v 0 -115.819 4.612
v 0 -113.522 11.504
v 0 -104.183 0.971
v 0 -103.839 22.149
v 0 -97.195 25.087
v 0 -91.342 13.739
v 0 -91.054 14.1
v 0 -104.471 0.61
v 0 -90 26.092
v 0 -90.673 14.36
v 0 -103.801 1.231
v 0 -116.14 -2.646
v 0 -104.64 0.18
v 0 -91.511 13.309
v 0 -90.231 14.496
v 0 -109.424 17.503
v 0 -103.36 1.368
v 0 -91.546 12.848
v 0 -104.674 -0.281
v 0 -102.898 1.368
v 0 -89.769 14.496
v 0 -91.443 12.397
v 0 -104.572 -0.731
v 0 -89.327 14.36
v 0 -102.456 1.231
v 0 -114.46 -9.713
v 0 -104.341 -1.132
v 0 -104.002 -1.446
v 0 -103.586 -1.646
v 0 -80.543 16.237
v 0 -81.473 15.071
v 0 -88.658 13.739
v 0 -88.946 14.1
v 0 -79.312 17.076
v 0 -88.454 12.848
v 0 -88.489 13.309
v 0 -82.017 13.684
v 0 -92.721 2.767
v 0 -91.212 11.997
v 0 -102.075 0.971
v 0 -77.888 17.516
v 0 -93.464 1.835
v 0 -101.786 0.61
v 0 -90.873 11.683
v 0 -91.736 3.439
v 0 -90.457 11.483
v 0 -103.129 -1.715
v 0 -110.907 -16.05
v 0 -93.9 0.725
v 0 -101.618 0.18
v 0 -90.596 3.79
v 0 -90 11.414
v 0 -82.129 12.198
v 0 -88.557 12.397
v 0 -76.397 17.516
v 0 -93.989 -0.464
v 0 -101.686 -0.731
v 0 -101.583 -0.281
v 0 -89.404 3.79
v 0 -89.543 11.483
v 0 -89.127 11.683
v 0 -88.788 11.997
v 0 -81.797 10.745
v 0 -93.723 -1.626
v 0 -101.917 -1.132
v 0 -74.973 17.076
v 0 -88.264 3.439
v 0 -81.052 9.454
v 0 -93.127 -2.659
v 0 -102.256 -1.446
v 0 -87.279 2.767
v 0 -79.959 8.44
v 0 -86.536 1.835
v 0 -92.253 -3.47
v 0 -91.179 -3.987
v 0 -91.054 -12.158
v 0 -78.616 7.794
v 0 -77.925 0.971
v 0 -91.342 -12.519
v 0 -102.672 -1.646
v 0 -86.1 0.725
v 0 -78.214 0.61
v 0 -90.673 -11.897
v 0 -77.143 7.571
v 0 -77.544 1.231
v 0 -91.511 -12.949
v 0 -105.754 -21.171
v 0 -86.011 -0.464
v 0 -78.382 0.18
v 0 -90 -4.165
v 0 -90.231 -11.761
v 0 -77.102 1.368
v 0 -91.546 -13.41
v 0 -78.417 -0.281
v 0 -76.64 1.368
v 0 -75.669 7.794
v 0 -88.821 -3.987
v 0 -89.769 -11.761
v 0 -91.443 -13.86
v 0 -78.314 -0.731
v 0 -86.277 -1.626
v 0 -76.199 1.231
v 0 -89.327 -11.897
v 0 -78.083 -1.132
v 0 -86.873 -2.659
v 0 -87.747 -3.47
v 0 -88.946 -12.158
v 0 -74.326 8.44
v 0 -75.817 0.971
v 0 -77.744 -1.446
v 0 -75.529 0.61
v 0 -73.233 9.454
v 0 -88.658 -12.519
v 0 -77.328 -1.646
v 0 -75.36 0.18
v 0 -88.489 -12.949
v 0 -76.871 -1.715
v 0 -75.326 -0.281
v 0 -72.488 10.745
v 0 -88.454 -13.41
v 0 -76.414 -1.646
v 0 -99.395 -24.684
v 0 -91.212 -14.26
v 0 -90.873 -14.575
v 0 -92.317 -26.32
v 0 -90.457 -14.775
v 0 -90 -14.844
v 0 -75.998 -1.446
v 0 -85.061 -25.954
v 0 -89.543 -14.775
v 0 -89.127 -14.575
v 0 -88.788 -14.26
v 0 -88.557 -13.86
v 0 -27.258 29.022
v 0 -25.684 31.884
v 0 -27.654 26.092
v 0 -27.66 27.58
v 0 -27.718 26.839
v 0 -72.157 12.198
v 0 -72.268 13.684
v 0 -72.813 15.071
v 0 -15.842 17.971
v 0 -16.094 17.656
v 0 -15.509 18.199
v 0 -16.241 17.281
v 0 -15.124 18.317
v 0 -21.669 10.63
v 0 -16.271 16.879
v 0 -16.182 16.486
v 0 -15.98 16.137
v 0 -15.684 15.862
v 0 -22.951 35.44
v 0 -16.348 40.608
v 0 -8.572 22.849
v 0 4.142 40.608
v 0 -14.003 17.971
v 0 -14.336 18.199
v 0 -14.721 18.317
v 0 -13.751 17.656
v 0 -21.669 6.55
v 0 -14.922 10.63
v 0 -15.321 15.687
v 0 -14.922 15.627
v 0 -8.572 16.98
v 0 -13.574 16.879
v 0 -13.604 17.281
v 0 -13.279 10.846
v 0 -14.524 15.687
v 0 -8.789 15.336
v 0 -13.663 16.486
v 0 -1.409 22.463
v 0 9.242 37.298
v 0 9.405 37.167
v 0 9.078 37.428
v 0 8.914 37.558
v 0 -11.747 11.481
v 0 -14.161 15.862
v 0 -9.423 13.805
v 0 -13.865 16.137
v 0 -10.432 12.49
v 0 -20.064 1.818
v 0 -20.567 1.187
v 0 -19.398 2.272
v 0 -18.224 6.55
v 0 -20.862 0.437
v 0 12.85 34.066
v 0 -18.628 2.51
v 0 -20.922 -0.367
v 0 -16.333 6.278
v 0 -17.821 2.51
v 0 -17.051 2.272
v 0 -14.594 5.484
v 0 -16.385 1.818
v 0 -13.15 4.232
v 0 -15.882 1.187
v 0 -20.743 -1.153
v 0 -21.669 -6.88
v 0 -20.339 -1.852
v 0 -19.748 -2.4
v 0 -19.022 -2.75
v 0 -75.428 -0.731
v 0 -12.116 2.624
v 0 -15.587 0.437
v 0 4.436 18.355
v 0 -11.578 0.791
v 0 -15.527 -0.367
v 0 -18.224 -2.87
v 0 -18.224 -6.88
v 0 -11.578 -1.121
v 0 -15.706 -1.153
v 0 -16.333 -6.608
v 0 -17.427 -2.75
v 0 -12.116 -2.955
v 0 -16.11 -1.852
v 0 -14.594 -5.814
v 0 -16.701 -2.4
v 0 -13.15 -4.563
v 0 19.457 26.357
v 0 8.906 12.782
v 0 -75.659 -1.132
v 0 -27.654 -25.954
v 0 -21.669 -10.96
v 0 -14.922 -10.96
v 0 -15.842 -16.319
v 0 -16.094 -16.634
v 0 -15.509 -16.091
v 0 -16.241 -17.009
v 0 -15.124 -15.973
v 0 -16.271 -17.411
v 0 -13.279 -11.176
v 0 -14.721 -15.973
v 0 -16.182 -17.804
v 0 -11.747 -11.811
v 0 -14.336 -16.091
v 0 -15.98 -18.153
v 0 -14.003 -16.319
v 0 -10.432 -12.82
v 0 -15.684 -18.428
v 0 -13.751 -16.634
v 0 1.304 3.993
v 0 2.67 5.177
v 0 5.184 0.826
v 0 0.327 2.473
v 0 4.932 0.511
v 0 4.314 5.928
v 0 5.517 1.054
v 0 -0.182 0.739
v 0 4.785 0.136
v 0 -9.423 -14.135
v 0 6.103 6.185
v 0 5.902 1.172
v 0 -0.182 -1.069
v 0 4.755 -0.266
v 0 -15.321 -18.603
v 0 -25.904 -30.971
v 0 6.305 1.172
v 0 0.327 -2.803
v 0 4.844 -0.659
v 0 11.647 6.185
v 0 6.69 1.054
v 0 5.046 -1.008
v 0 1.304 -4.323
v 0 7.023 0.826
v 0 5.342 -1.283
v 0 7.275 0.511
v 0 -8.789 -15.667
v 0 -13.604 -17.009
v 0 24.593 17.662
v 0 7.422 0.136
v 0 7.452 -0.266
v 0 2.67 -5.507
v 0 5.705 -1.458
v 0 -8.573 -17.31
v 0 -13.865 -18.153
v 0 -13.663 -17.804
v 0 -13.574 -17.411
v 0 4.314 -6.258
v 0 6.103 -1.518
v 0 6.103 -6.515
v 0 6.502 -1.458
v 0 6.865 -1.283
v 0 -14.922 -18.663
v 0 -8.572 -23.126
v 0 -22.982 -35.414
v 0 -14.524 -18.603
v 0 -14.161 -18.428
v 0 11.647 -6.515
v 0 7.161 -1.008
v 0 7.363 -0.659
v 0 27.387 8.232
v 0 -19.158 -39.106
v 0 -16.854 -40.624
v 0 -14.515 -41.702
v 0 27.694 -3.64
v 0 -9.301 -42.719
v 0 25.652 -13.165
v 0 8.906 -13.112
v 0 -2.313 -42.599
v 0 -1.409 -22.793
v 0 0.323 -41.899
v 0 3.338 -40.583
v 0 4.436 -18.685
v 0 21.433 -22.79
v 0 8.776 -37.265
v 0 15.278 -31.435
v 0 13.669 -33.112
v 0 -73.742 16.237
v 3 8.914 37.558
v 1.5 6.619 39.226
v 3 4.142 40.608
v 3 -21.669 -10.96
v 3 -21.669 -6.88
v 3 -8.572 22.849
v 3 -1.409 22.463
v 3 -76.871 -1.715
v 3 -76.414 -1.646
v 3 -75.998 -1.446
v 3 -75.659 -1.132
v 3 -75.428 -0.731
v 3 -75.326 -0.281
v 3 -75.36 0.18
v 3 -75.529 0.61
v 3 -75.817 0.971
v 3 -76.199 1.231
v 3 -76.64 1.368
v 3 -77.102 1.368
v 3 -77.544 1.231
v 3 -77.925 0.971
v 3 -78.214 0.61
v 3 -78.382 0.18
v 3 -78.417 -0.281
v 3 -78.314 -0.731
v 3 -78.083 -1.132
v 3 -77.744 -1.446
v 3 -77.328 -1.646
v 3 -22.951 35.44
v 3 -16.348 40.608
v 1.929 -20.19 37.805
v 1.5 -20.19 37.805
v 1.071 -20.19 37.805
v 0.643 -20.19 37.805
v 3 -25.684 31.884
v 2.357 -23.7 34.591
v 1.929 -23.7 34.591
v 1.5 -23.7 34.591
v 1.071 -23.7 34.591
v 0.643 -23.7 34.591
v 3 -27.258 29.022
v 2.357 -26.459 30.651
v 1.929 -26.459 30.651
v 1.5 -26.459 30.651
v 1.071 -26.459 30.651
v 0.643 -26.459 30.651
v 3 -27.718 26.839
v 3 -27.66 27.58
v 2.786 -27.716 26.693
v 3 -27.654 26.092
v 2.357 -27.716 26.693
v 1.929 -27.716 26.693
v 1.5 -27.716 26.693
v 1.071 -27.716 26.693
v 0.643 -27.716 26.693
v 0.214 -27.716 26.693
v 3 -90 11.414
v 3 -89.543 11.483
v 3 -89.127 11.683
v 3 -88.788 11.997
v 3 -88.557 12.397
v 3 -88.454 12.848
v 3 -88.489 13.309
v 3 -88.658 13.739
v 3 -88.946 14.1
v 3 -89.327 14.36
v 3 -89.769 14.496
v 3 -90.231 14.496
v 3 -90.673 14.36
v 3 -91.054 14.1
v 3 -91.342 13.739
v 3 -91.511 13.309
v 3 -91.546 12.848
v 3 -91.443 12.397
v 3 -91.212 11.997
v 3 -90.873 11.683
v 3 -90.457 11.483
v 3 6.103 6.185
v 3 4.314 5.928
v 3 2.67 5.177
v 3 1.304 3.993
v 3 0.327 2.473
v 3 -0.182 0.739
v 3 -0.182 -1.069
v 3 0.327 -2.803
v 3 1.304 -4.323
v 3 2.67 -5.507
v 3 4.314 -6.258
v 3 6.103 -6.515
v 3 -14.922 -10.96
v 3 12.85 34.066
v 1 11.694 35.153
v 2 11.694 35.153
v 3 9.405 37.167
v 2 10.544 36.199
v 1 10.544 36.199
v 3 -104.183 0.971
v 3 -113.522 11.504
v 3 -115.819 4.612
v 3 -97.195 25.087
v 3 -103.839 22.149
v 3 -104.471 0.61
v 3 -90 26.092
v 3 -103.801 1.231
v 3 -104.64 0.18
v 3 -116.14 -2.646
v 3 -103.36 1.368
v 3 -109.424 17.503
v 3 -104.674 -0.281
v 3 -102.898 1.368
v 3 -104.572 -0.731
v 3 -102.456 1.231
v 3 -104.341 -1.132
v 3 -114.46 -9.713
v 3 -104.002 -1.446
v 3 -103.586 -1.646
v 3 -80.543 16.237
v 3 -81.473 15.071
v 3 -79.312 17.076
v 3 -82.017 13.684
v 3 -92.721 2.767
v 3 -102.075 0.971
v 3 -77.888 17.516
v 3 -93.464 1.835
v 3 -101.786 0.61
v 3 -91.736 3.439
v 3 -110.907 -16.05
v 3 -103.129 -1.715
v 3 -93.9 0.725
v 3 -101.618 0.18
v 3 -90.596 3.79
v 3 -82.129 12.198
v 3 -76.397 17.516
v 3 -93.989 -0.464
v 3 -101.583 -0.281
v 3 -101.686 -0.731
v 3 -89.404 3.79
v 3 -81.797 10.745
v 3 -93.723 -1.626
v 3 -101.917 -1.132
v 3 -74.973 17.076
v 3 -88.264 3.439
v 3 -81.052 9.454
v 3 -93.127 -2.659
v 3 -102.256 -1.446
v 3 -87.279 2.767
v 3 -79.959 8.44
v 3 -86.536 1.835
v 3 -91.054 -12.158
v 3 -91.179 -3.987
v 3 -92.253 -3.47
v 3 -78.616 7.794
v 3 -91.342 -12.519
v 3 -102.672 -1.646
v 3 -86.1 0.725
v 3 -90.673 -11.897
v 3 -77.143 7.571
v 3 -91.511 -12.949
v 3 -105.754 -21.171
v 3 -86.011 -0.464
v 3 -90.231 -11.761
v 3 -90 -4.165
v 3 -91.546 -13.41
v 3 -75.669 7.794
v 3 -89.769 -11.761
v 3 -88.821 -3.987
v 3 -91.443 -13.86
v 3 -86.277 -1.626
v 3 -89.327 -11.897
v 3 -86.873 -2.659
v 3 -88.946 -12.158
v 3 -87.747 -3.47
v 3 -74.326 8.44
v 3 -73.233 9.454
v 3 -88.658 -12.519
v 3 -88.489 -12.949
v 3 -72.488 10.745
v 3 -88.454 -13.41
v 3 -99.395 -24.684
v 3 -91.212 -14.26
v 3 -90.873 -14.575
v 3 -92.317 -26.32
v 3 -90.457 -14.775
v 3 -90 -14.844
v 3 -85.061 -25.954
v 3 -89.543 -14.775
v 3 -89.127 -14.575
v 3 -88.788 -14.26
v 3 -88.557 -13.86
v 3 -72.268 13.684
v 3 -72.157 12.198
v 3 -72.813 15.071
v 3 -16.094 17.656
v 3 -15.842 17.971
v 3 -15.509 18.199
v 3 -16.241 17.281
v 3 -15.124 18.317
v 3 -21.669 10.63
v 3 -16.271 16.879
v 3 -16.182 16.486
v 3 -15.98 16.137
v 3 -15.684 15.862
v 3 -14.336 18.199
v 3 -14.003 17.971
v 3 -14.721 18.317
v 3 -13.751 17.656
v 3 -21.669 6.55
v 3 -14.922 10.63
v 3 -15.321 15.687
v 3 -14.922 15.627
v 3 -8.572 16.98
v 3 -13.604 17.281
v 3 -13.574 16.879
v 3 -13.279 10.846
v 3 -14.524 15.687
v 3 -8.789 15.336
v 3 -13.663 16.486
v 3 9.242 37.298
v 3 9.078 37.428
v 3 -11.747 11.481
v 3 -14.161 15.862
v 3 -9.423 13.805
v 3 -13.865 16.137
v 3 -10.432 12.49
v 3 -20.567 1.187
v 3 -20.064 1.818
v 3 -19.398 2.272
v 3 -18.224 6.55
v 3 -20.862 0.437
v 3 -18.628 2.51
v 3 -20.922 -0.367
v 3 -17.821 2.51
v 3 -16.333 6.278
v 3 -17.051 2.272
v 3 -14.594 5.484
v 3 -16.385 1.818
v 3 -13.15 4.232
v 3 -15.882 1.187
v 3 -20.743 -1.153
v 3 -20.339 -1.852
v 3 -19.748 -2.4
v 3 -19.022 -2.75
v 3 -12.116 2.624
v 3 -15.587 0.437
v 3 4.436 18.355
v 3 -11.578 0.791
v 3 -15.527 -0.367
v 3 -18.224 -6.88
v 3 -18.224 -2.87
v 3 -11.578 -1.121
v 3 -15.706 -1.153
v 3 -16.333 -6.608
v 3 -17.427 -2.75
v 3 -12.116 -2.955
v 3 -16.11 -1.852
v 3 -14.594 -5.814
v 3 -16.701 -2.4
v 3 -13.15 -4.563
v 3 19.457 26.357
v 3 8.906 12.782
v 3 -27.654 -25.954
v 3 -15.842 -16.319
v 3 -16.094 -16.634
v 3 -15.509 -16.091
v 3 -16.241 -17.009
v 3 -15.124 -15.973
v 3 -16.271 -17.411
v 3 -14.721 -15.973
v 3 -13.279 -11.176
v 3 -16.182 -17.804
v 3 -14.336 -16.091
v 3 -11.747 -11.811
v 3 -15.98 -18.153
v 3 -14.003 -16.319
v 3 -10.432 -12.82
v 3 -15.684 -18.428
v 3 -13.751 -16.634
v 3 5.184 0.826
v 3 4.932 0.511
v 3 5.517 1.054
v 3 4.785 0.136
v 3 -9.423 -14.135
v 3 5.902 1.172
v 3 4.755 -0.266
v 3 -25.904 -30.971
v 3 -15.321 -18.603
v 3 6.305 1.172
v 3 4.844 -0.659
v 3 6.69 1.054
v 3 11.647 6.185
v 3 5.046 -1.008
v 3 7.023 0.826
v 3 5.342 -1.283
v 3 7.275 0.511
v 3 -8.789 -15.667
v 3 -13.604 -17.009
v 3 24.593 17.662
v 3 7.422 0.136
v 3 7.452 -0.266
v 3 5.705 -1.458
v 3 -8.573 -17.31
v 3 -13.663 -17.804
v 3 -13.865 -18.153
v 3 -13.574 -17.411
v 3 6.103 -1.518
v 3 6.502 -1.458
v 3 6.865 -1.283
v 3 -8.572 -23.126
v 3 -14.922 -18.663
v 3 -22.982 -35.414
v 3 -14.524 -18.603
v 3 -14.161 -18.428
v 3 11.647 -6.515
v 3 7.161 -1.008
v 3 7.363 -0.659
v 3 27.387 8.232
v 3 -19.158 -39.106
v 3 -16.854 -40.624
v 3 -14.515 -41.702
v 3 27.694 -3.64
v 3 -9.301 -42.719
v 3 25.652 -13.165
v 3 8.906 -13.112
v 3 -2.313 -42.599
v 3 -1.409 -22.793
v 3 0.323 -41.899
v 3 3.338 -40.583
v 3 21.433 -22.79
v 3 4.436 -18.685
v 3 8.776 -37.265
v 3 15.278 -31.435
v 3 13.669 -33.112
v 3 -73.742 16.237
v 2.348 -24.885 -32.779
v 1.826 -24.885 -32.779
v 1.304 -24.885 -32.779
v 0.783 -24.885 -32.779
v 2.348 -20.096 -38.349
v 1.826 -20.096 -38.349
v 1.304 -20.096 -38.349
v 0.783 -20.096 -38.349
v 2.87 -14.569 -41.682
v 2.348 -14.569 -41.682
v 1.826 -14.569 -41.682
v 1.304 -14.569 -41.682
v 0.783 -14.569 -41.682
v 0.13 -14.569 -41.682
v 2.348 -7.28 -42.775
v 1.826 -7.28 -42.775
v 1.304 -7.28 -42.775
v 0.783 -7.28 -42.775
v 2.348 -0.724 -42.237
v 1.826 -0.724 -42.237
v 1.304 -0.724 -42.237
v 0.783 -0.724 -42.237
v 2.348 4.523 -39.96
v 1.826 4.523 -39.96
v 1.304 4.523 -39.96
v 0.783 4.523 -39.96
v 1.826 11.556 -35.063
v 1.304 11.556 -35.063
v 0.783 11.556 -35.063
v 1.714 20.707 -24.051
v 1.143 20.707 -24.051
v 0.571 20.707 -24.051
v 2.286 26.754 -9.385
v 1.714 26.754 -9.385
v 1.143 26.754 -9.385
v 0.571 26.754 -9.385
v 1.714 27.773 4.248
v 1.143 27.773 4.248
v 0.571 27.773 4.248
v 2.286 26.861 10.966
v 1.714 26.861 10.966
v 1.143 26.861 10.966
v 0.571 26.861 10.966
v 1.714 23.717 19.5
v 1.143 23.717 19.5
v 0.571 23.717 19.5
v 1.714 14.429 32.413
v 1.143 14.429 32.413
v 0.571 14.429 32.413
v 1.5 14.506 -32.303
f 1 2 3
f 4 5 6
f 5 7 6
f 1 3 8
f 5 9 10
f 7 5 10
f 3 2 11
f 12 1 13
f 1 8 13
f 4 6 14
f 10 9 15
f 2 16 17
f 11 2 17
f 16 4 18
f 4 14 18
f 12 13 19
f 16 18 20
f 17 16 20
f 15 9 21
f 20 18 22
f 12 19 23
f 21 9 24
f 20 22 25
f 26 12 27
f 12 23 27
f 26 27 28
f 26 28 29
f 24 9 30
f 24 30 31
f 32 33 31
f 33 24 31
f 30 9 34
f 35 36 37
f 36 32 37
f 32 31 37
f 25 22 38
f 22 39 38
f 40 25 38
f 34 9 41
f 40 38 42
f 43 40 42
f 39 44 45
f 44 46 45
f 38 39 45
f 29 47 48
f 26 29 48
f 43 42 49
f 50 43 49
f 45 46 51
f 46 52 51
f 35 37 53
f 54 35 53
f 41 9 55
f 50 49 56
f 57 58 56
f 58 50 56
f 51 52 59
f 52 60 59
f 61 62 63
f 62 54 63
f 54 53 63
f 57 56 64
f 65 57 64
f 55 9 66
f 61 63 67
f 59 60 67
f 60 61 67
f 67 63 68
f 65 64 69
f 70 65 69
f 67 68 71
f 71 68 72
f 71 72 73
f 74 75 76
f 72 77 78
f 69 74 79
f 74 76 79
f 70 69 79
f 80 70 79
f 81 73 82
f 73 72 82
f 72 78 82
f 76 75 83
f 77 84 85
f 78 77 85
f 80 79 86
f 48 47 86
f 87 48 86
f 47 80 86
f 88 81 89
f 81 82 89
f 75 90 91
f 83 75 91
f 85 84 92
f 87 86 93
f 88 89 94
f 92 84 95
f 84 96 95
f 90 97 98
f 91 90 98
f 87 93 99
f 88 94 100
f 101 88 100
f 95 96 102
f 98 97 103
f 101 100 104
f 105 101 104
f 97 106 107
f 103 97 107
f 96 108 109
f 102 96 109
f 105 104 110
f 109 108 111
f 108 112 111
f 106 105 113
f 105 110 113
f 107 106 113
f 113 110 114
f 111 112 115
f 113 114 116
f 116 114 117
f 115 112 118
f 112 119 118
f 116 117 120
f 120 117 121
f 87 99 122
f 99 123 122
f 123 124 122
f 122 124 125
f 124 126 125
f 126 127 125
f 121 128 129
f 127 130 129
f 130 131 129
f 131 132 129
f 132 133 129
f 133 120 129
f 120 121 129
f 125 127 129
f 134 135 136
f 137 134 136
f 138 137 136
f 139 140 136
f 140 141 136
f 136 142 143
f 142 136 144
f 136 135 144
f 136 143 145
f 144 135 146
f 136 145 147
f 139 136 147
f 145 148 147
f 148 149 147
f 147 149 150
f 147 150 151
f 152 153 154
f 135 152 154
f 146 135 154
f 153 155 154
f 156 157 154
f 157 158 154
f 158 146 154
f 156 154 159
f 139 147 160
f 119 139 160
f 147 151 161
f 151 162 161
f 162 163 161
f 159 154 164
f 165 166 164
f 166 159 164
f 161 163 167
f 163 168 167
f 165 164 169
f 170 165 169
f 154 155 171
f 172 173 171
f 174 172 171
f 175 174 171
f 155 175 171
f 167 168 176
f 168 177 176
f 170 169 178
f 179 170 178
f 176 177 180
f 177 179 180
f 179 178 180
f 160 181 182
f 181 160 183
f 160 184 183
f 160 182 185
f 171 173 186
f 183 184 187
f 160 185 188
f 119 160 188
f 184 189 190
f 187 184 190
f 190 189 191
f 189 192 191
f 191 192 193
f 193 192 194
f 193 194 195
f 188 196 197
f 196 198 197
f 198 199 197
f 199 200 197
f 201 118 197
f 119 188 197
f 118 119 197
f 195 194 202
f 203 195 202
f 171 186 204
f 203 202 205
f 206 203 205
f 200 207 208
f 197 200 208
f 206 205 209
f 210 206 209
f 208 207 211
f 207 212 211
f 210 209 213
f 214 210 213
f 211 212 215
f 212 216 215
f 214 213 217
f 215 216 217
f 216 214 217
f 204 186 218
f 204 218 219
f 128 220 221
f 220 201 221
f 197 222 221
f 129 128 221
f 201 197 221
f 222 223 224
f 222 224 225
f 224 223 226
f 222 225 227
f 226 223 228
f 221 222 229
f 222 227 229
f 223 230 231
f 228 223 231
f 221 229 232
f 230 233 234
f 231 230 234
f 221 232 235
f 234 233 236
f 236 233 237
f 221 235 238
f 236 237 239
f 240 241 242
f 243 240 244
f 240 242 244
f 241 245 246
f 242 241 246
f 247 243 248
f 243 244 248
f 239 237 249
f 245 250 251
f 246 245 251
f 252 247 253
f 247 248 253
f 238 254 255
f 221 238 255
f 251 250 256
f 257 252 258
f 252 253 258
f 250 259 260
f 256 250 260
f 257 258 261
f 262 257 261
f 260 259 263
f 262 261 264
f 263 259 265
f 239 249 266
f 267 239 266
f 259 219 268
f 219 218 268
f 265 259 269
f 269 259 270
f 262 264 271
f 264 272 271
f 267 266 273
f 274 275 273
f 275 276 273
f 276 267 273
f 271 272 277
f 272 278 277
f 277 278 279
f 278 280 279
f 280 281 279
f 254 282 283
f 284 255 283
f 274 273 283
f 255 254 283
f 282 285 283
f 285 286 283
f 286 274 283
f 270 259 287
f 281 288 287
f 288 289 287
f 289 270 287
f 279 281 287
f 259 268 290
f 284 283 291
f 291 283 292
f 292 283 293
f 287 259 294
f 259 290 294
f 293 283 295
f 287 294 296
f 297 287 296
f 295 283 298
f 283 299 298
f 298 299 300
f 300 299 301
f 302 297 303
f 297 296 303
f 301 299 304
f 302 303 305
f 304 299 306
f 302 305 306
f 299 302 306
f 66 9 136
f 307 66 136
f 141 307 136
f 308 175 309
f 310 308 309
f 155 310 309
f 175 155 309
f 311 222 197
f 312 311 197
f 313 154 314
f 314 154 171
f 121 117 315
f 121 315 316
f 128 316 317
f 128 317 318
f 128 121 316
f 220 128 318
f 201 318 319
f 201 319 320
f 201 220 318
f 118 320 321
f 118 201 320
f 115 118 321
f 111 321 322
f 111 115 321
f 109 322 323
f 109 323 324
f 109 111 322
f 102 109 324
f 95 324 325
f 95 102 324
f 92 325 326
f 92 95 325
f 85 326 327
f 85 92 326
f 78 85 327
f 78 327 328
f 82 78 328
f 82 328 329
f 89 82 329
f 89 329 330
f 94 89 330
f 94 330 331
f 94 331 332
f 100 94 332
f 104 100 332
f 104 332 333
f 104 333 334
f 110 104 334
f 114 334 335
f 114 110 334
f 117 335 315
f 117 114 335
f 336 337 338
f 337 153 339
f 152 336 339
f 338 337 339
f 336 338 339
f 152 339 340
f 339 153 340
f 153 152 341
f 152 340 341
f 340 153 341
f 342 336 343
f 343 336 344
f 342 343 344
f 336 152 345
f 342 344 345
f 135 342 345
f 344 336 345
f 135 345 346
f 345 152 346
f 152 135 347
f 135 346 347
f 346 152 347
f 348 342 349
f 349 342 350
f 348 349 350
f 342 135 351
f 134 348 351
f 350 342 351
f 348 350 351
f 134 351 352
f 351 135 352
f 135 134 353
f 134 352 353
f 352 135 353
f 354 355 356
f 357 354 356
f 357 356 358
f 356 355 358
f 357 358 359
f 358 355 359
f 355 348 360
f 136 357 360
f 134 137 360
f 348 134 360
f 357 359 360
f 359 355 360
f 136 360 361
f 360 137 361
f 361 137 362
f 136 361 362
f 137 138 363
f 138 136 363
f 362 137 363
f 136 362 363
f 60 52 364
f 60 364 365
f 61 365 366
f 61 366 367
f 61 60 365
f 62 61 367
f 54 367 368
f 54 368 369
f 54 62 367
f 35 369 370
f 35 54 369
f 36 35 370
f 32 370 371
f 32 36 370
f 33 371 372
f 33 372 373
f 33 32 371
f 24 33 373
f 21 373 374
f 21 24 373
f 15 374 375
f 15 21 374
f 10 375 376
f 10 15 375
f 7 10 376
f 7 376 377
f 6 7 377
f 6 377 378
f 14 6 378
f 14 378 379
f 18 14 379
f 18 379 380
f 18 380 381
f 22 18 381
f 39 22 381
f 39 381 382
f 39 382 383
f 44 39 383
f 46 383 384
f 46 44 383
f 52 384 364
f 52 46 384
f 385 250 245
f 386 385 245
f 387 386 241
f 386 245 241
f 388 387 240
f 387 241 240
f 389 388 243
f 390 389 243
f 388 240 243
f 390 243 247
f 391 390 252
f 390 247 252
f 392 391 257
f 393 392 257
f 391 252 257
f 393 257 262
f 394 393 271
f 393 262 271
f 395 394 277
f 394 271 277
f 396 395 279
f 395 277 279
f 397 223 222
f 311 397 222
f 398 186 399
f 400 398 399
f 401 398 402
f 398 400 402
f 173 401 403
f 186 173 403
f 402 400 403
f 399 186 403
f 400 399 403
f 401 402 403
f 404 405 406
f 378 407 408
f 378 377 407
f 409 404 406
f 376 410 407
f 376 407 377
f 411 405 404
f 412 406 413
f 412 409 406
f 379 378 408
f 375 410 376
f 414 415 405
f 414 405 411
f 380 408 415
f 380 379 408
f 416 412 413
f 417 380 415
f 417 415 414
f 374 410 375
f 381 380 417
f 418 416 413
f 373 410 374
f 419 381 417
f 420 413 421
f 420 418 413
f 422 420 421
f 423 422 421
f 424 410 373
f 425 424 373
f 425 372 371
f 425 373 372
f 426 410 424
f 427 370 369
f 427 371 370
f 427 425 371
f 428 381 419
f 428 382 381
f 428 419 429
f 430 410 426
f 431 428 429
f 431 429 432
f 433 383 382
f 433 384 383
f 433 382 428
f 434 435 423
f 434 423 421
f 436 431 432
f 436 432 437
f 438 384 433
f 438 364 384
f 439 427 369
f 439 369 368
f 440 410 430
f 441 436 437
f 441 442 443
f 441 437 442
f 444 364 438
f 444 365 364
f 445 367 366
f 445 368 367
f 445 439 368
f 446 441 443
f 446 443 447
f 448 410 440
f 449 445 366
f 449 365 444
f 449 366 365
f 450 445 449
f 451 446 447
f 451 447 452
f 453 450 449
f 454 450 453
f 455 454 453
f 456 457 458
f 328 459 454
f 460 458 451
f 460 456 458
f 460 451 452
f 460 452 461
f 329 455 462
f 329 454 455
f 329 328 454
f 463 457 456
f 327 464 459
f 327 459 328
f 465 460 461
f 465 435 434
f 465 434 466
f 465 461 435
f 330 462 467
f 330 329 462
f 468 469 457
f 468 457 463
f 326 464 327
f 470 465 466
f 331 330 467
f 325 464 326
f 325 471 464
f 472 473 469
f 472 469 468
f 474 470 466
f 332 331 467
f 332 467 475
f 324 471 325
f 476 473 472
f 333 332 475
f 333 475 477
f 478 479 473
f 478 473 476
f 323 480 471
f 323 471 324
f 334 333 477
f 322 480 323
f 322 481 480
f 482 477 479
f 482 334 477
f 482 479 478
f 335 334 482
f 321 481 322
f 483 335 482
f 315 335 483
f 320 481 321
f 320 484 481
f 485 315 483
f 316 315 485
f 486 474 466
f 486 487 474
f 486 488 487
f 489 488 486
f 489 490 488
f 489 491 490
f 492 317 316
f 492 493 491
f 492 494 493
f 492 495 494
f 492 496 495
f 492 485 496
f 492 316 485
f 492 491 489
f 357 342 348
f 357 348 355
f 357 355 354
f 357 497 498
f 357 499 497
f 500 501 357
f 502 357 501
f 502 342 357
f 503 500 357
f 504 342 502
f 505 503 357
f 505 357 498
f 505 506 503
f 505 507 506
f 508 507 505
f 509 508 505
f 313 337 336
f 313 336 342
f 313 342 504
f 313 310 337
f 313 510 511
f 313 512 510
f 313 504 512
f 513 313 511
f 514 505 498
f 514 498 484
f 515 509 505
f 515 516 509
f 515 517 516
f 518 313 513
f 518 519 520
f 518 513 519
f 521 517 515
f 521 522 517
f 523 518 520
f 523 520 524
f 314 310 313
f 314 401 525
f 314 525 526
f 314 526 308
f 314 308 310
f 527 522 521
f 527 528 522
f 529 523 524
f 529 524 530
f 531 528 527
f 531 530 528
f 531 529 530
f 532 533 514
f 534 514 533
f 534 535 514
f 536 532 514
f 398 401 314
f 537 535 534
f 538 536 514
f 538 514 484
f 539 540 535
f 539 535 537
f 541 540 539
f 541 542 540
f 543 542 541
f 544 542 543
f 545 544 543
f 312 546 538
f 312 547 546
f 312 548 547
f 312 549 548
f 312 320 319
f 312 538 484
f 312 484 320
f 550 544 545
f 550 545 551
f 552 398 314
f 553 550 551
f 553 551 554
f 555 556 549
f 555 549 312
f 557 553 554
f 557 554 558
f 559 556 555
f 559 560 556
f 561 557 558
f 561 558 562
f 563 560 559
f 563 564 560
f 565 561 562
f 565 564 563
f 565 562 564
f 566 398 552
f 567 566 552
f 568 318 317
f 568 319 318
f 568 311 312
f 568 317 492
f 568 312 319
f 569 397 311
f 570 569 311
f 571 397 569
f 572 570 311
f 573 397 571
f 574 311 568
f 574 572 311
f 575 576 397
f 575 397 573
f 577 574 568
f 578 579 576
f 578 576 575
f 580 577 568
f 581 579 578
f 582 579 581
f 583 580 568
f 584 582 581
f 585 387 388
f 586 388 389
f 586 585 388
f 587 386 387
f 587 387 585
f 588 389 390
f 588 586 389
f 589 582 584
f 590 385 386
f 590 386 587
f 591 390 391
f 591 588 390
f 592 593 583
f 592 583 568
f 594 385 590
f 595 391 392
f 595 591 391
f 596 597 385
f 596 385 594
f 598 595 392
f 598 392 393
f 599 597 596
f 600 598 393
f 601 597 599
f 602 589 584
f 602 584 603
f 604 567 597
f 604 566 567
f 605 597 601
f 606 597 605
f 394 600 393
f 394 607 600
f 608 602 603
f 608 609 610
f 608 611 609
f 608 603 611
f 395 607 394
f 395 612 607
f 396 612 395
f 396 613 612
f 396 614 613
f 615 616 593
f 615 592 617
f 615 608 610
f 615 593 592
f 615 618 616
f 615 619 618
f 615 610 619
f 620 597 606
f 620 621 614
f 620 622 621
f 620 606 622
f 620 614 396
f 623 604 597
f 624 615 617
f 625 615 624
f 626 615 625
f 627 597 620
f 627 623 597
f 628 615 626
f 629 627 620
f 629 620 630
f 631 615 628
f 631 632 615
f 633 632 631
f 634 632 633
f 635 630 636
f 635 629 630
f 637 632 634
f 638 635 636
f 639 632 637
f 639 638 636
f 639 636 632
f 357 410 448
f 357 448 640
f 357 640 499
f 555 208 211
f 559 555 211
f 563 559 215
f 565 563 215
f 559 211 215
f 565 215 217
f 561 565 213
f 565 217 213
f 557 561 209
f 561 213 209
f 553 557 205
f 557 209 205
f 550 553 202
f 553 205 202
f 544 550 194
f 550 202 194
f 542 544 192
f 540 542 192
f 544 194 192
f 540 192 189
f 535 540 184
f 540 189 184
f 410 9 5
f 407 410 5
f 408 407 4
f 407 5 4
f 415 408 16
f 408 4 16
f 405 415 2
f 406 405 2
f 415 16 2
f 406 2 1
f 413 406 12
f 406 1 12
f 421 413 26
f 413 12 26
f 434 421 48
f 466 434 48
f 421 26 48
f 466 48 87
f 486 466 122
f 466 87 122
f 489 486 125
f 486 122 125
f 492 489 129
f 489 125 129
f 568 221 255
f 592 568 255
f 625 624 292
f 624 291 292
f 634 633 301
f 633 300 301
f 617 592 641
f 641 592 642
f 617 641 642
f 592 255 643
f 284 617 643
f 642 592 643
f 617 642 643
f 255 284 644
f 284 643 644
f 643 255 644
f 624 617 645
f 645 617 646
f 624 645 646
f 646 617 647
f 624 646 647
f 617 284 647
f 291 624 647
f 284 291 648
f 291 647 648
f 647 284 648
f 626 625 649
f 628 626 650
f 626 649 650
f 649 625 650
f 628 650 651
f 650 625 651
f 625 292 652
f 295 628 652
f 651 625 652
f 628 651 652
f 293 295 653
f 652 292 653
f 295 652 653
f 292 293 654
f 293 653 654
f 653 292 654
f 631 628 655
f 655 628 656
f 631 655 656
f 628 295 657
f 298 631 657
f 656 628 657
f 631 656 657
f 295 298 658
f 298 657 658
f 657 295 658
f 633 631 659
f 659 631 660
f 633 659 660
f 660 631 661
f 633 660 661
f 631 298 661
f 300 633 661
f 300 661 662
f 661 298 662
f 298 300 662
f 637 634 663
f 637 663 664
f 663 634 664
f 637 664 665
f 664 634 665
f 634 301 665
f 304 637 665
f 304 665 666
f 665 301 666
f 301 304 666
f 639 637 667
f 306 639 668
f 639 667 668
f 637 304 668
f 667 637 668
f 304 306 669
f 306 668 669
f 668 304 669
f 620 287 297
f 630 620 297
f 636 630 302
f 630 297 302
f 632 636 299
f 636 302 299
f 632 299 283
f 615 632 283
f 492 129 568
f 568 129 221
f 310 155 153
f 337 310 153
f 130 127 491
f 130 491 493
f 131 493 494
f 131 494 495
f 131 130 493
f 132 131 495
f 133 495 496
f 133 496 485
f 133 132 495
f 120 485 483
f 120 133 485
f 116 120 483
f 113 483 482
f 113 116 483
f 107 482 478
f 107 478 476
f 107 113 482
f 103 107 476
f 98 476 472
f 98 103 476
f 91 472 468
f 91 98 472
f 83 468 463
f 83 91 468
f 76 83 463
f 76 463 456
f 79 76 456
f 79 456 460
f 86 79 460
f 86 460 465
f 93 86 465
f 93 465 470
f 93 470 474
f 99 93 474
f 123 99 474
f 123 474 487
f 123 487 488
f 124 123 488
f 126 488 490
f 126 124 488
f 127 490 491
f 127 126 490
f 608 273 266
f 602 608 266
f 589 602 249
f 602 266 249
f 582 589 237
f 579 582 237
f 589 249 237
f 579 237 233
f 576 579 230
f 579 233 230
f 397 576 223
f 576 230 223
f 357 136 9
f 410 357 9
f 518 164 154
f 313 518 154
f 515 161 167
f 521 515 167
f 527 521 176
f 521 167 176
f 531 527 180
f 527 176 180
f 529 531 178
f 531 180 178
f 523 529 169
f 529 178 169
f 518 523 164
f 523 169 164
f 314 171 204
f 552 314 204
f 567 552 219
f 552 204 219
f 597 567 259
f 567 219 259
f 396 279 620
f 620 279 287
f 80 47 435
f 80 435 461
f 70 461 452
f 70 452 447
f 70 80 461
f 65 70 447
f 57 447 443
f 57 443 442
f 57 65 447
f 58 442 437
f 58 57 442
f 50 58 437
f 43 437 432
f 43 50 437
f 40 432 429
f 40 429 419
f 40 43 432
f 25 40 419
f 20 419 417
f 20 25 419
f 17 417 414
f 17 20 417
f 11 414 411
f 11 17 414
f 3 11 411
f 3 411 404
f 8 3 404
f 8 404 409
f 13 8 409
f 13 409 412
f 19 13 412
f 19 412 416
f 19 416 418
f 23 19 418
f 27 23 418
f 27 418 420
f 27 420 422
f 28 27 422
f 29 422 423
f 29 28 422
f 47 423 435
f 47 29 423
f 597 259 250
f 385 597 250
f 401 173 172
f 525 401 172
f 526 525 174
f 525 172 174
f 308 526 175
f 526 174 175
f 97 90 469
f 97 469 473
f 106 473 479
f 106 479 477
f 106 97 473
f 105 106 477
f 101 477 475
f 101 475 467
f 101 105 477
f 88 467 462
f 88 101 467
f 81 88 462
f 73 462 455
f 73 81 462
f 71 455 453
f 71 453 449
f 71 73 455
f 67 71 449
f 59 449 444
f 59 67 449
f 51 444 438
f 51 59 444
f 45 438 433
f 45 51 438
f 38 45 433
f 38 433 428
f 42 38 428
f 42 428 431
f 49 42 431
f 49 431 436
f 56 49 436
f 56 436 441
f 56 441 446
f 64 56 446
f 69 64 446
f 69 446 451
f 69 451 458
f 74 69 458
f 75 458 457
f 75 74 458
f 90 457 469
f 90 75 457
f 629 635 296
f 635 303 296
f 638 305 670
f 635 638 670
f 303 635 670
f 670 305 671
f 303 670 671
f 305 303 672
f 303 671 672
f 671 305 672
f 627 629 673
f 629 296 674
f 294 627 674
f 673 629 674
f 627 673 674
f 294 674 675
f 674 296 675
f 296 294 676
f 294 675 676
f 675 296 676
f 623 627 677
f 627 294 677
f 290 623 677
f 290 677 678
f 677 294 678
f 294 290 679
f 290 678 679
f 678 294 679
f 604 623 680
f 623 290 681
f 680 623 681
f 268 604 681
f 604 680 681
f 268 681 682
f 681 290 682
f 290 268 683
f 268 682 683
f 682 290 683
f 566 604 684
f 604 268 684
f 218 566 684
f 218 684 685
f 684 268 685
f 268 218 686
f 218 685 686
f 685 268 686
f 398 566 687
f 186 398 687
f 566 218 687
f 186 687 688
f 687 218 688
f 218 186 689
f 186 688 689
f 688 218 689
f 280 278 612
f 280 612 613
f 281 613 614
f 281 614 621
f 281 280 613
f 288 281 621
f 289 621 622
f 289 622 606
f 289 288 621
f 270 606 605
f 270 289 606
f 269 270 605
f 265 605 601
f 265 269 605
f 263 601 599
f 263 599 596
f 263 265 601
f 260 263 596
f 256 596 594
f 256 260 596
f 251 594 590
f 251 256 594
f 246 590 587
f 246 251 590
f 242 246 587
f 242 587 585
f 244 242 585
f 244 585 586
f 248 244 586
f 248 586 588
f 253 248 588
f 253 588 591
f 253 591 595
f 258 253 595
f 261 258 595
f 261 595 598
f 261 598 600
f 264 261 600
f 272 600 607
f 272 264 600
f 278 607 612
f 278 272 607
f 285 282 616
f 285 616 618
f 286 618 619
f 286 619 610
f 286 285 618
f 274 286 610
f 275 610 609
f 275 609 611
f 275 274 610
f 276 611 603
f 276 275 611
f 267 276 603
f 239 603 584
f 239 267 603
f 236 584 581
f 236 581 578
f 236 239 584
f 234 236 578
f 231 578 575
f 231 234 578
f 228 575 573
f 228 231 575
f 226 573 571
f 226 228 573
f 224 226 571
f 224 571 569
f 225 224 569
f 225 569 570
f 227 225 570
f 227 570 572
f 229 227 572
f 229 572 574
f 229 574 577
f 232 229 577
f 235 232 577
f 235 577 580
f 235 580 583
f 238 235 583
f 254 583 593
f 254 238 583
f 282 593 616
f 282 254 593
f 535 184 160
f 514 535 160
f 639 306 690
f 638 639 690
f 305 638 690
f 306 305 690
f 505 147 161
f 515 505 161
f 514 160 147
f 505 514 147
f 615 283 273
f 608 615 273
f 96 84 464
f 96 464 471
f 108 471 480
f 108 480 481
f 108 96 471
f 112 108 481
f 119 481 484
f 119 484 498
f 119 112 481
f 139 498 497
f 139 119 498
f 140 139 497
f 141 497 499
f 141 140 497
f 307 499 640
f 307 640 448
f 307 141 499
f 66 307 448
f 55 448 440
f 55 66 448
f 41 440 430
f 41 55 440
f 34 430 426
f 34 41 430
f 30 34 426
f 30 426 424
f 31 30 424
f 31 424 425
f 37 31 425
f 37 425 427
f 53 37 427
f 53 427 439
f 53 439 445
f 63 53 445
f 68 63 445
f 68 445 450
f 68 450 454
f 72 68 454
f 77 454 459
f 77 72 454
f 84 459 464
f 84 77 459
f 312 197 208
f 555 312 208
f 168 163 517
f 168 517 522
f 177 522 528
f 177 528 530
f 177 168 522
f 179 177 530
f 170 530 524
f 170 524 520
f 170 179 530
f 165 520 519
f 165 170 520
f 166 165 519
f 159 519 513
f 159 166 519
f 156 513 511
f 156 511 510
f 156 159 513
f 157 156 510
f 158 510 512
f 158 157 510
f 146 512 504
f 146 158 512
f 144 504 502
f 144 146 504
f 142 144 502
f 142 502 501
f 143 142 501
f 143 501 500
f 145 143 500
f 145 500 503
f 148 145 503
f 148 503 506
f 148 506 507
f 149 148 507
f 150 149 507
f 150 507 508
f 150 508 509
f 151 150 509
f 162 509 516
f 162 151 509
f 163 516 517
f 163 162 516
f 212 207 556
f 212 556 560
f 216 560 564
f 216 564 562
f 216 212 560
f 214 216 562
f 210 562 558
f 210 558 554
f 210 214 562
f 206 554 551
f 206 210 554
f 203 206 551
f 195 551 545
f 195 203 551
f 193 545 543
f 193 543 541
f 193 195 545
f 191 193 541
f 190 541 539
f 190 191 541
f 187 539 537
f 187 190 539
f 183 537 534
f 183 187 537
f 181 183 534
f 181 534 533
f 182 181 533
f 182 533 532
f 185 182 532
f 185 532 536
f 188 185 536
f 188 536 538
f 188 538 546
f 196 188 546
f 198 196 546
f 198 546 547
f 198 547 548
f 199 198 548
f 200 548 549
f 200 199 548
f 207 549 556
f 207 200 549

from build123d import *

# Parameters (mm, degrees)
ESQUISSE4_R        = 1.55
ESQUISSE4_R_2      = 4
ESQUISSE4_R_3      = 5
ESQUISSE4_R_4      = 1.35255
ESQUISSE4_R_5      = 2.7051
BOSS_EXTRU_3_DEPTH = 3


with BuildPart() as part:
    # Esquisse4 → Boss.-Extru.3 (new body)
    with BuildSketch(Plane(origin=(0, 0, 0), x_dir=(0, 0, -1), z_dir=(1, 0, 0))):
        with BuildLine():
            Line((-40.60825, -12.7), (-40.60825, -16.144875))
            Line((-40.60825, -16.144875), (-40.60825, -16.348305132))
            add(Edge.make_bspline(
                [(-40.60825, -16.348305132), (-40.365634485, -16.661193605), (-40.112338127, -16.96547542), (-39.63020507, -17.593748723), (-39.400688032, -17.917191992), (-38.719045939, -18.893089111), (-38.271947044, -19.549593057), (-37.338540998, -20.831006808), (-36.855460104, -21.458516341), (-36.059725811, -22.342477591), (-35.781944124, -22.627029047), (-35.202868212, -23.17718548), (-34.900674383, -23.443503751), (-33.971943166, -24.212706181), (-33.324405882, -24.685383849), (-32.010805282, -25.604549776), (-31.348089528, -26.055770333), (-30.303090708, -26.660610546), (-29.948270215, -26.848696892), (-29.222483721, -27.184971005), (-28.851412004, -27.333773538), (-28.083597976, -27.570691368), (-27.685315555, -27.657976057), (-27.090666934, -27.715403346), (-26.891908645, -27.722631025), (-26.592836888, -27.712936491), (-26.492990431, -27.706278992), (-26.292963936, -27.685632014), (-26.192732932, -27.670522326), (-26.092449031, -27.65425)],
                knots=[0, 0, 0, 0, 0.0625, 0.0625, 0.125, 0.125, 0.25, 0.25, 0.375, 0.375, 0.4375, 0.4375, 0.5, 0.5, 0.625, 0.625, 0.75, 0.75, 0.8125, 0.8125, 0.875, 0.875, 0.9375, 0.9375, 0.96875, 0.96875, 0.984375, 0.984375, 1, 1, 1, 1], degree=3))
            Line((-26.092449031, -27.65425), (-26.092449031, -90))
            ThreePointArc((-26.092449031, -90), (2.64551669, -116.14013034), (25.954024412, -85.06135051))
            Line((25.954024412, -85.06135051), (25.954024412, -27.65425))
            add(Edge.make_bspline(
                [(25.954024412, -27.65425), (27.179118802, -27.419536533), (28.353377808, -27.051803075), (30.05705383, -26.34918771), (30.615126485, -26.089288473), (31.712904721, -25.521429223), (32.254485024, -25.212118815), (33.827204106, -24.230350536), (34.814025463, -23.502087852), (36.672007358, -21.907218093), (37.543320305, -21.040793316), (38.751902771, -19.623473398), (39.134714509, -19.134962989), (39.851014333, -18.131439591), (40.185535135, -17.615291382), (40.801362362, -16.550595558), (41.082635497, -16.002027673), (41.457015911, -15.150237789), (41.574249194, -14.86042264), (41.789713906, -14.277065554), (41.888049248, -13.98351322), (42.334688534, -12.506770959), (42.546239761, -11.296312151), (42.717568356, -9.451511475), (42.750611649, -8.83067761), (42.772859866, -7.900507946), (42.775360474, -7.590422151), (42.77555993, -6.970221998), (42.772087252, -6.66010067), (42.772087252, -6.35)],
                knots=[0, 0, 0, 0, 0.125, 0.125, 0.1875, 0.1875, 0.25, 0.25, 0.375, 0.375, 0.5, 0.5, 0.5625, 0.5625, 0.625, 0.625, 0.6875, 0.6875, 0.71875, 0.71875, 0.75, 0.75, 0.875, 0.875, 0.9375, 0.9375, 0.96875, 0.96875, 1, 1, 1, 1], degree=3))
            add(Edge.make_bspline(
                [(42.772087252, -6.35), (42.772087252, -5.874878454), (42.783792207, -5.398095979), (42.789657917, -4.447020546), (42.781867467, -3.973004463), (42.672546396, -2.563152451), (42.499179213, -1.637510108), (42.106282017, -0.267897459), (41.954068536, 0.185625042), (41.614819435, 1.087728793), (41.430081297, 1.530283034), (40.844911495, 2.839259084), (40.416604561, 3.689518781), (39.046783283, 6.190525131), (38.013123304, 7.787251584), (36.291657446, 10.082106977), (35.688509547, 10.830664164), (34.43654182, 12.281738953), (33.786199883, 12.985690235), (33.112075, 13.668565083)],
                knots=[0, 0, 0, 0, 0.0625, 0.0625, 0.125, 0.125, 0.25, 0.25, 0.3125, 0.3125, 0.375, 0.375, 0.5, 0.5, 0.75, 0.75, 0.875, 0.875, 1, 1, 1, 1], degree=3))
            add(Edge.make_bspline(
                [(33.112075, 13.668565083), (32.332207955, 14.539101946), (31.435060987, 15.277734234)],
                knots=[0, 0, 0, 1, 1, 1], degree=2))
            add(Edge.make_bspline(
                [(31.435060987, 15.277734234), (30.299691041, 16.309376592), (29.113704516, 17.275445235), (26.646604831, 19.084346085), (25.360475951, 19.928267183), (21.432297769, 22.265681686), (18.70167828, 23.563722979), (14.477833082, 25.213127628), (13.049229105, 25.71486416), (10.864398428, 26.369911185), (10.129061703, 26.571832136), (8.64156399, 26.936524394), (7.890831572, 27.098844789), (5.637990782, 27.512412208), (4.127431428, 27.693727696), (2.225306731, 27.768676851), (1.844136038, 27.775542931), (1.080940786, 27.779973661), (0.698904769, 27.777413484), (-0.446346689, 27.779064109), (-1.208874123, 27.797823926), (-2.732682239, 27.815308111), (-3.492085471, 27.806304753), (-5.004084105, 27.739990771), (-5.756994671, 27.684916502), (-8.006157922, 27.451797552), (-9.492662784, 27.204583891), (-11.701987236, 26.688775277), (-12.434852331, 26.491461598), (-13.894254142, 26.051929085), (-14.622118919, 25.807493497), (-16.765417144, 25.01223388), (-18.151500369, 24.400517874), (-20.847821735, 23.032525232), (-22.158708475, 22.277484827), (-24.716496252, 20.645447351), (-25.966430559, 19.7652326), (-28.39125747, 17.919703458), (-29.567431908, 16.954258357), (-31.287557173, 15.454109034), (-31.85380584, 14.945666112), (-32.972832423, 13.91291508), (-33.52577931, 13.388805977), (-34.066096443, 12.849822171)],
                knots=[0, 0, 0, 0, 0.0625, 0.0625, 0.125, 0.125, 0.25, 0.25, 0.3125, 0.3125, 0.34375, 0.34375, 0.375, 0.375, 0.4375, 0.4375, 0.453125, 0.453125, 0.46875, 0.46875, 0.5, 0.5, 0.53125, 0.53125, 0.5625, 0.5625, 0.625, 0.625, 0.65625, 0.65625, 0.6875, 0.6875, 0.75, 0.75, 0.8125, 0.8125, 0.875, 0.875, 0.9375, 0.9375, 0.96875, 0.96875, 1, 1, 1, 1], degree=3))
            add(Edge.make_bspline(
                [(-34.066096443, 12.849822171), (-35.159801618, 11.692162737), (-36.251081621, 10.53740284), (-37.166580532, 9.404947171)],
                knots=[0, 0, 0, 0, 1, 1, 1, 1], degree=3))
            ThreePointArc((-37.166580532, 9.404947171), (-37.363014685, 9.160281042), (-37.557796616, 8.914297524))
            add(Edge.make_bspline(
                [(-37.557796616, 8.914297524), (-38.142933539, 8.170182683), (-38.709522845, 7.412667282), (-39.741912272, 5.824816801), (-40.203133529, 4.998794666), (-40.60825, 4.142494902)],
                knots=[0, 0, 0, 0, 0.5, 0.5, 1, 1, 1, 1], degree=3))
            Line((-40.60825, 4.142494902), (-40.60825, -12.7))
        make_face()
        with Locations((0.1651, -103.128774516)):
            Circle(ESQUISSE4_R, mode=Mode.SUBTRACT)
        with Locations((-12.963674516, -90)):
            Circle(ESQUISSE4_R, mode=Mode.SUBTRACT)
        with Locations((0.1651, -90)):
            Circle(ESQUISSE4_R_2, mode=Mode.SUBTRACT)
        with Locations((-12.571436854, -77.1426291)):
            Circle(ESQUISSE4_R_3, mode=Mode.SUBTRACT)
        with Locations((0.1651, -76.871225484)):
            Circle(ESQUISSE4_R, mode=Mode.SUBTRACT)
        with Locations((13.293874516, -90)):
            Circle(ESQUISSE4_R, mode=Mode.SUBTRACT)
        with Locations((-16.9799, -14.9225)):
            Circle(ESQUISSE4_R_4, mode=Mode.SUBTRACT)
        with Locations((0.1651, -18.2245)):
            Circle(ESQUISSE4_R_5, mode=Mode.SUBTRACT)
        with BuildLine():
            Line((-6.1849, 11.646916554), (-6.1849, 6.103472306))
            ThreePointArc((-6.1849, 6.103472306), (0.1651, -0.246527694), (6.5151, 6.103472306))
            Line((6.5151, 6.103472306), (6.5151, 11.646916554))
            ThreePointArc((6.5151, 11.646916554), (16.056799278, 6.86795928), (22.793325, -1.408614826))
            Line((22.793325, -1.408614826), (23.12590424, -8.5725))
            Line((23.12590424, -8.5725), (17.3101, -8.5725))
            ThreePointArc((17.3101, -8.5725), (12.819971939, -10.432371939), (10.9601, -14.9225))
            Line((10.9601, -14.9225), (10.9601, -21.669375))
            Line((10.9601, -21.669375), (6.880225, -21.669375))
            Line((6.880225, -21.669375), (6.880225, -18.2245))
            ThreePointArc((6.880225, -18.2245), (0.1651, -11.509375), (-6.550025, -18.2245))
            Line((-6.550025, -18.2245), (-6.550025, -21.669375))
            Line((-6.550025, -21.669375), (-10.6299, -21.669375))
            Line((-10.6299, -21.669375), (-10.6299, -14.9225))
            ThreePointArc((-10.6299, -14.9225), (-12.489771939, -10.432371939), (-16.9799, -8.5725))
            Line((-16.9799, -8.5725), (-22.848998606, -8.5725))
            Line((-22.848998606, -8.5725), (-22.463125, -1.408614826))
            ThreePointArc((-22.463125, -1.408614826), (-15.726599278, 6.86795928), (-6.1849, 11.646916554))
        make_face(mode=Mode.SUBTRACT)
        with Locations((0.1651, 6.103472306)):
            Circle(ESQUISSE4_R_4, mode=Mode.SUBTRACT)
        with Locations((17.3101, -14.9225)):
            Circle(ESQUISSE4_R_4, mode=Mode.SUBTRACT)
    extrude(amount=BOSS_EXTRU_3_DEPTH)


solid = part.part
